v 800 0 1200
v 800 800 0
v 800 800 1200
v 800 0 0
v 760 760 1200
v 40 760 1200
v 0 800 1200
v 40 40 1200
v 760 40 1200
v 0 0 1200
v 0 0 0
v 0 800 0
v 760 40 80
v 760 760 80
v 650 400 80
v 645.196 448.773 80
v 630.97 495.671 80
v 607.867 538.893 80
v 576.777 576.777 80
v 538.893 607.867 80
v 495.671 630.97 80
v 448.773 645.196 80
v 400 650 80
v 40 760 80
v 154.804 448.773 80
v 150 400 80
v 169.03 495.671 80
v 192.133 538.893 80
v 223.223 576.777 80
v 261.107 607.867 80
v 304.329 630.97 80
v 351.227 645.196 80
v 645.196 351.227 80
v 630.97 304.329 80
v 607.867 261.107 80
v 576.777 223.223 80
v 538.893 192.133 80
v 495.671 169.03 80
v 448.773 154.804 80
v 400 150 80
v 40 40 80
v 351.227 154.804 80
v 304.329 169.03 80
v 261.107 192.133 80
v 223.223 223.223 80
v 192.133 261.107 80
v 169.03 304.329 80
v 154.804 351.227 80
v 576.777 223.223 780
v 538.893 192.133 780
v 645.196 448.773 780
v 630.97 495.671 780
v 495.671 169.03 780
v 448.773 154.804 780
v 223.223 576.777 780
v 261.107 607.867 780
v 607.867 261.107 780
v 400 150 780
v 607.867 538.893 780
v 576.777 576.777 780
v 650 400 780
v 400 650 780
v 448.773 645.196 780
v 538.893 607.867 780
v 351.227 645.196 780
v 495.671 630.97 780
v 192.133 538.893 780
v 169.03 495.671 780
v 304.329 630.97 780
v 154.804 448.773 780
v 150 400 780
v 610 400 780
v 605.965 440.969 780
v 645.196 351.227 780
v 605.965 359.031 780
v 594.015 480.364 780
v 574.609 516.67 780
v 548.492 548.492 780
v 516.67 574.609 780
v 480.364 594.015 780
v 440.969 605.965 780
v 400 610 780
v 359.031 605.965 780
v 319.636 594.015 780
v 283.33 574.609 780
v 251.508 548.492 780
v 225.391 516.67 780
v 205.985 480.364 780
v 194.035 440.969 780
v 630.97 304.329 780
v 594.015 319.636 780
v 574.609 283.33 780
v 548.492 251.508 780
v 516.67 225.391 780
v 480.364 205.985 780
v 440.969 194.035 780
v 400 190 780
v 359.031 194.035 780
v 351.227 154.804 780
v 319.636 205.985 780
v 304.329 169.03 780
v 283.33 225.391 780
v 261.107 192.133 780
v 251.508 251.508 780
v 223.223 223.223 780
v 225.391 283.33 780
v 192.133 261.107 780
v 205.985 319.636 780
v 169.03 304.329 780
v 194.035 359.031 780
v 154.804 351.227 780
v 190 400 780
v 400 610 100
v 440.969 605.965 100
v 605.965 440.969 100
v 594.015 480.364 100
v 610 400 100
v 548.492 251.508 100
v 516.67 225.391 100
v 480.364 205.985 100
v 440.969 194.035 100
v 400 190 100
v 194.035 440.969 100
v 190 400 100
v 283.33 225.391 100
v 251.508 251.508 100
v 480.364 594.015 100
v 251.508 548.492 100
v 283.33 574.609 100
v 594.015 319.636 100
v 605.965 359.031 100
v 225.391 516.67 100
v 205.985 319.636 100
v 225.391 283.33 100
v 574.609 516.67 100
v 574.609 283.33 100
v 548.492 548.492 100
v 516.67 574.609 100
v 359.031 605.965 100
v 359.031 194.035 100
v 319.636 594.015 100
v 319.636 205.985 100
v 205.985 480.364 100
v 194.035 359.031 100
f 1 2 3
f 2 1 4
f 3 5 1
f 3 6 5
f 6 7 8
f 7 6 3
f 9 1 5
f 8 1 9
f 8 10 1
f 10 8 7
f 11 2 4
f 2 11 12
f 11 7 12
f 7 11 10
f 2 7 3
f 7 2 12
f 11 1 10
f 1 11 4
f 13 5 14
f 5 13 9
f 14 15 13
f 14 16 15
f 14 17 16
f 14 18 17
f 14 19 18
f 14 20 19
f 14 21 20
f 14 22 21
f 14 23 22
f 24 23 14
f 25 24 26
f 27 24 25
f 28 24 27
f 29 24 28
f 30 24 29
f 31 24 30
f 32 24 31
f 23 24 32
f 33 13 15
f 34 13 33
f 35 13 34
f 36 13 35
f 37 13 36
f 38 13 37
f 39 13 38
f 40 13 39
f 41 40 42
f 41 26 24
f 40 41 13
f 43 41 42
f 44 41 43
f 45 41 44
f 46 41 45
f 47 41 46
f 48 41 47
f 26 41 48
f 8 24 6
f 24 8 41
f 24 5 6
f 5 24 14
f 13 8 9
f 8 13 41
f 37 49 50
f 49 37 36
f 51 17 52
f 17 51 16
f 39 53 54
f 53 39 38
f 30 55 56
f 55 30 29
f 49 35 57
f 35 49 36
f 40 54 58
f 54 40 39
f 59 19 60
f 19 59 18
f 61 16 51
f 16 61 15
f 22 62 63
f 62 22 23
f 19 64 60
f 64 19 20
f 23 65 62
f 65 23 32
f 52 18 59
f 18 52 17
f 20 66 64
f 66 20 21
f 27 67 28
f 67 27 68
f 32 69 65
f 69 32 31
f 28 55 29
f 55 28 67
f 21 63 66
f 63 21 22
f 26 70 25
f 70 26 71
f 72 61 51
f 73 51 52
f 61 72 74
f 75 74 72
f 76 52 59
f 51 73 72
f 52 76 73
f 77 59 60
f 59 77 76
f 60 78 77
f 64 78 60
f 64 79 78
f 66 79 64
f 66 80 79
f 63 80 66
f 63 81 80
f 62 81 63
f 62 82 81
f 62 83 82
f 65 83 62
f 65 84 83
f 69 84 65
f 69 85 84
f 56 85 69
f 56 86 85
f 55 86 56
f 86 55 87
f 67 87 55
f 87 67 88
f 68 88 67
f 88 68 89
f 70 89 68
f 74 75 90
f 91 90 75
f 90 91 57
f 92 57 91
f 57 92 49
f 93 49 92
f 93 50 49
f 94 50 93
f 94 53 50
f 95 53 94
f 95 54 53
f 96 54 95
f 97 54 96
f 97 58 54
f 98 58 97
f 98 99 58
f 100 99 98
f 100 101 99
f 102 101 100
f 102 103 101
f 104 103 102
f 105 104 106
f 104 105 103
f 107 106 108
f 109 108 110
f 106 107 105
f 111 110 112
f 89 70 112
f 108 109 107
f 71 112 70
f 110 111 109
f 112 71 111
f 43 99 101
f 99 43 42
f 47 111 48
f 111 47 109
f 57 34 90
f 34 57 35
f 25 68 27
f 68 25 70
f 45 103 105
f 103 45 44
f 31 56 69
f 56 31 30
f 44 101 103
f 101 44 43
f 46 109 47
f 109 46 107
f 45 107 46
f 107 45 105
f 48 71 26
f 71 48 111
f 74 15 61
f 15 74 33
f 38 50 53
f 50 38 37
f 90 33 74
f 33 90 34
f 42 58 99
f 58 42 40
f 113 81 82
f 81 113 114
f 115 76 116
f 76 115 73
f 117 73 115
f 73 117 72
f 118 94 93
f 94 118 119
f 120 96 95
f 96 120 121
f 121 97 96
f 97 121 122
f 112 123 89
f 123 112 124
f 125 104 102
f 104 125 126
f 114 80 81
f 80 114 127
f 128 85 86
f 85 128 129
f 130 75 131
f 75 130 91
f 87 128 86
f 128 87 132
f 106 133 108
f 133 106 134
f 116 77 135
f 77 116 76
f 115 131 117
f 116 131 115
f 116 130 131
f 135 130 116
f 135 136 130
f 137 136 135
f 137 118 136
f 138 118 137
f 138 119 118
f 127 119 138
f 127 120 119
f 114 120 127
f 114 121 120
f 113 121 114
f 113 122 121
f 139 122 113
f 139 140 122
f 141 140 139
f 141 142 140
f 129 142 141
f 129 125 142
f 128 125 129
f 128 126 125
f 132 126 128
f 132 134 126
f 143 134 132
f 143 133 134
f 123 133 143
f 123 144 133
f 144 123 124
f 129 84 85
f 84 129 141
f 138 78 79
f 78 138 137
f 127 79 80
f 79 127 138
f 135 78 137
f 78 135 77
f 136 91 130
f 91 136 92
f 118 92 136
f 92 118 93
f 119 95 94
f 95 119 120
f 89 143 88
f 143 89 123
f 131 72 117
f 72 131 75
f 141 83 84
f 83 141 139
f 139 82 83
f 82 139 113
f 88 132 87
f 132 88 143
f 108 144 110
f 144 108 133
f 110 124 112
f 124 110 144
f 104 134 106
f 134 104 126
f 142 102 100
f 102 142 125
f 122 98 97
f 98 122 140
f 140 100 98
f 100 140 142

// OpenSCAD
// file: ../params.scad
// Shared millimetre parameters. Keep in lockstep with freecad/params.py.
// Module scale: 150 kg/day wet train. Walls are CPVC sheet, not metal.

$fn = 36;

WALL        = 12;     // CPVC sheet thickness
FLOOR       = 16;     // floor plate (trough sits on this)

// LEACH CSTR 1 — inside liquor box
CSTR_L      = 2000;
CSTR_W      = 1200;
CSTR_H      = 1400;   // liquid + freeboard
FREEBOARD   = 200;

// CSTR 2 weir (same vessel, +X wall)
WEIR_W      = 450;
WEIR_CREST  = CSTR_H - FREEBOARD;   // from inner floor
WEIR_SLOT_H = 80;
WEIR_LIP    = 120;    // external spout projection

// CSTR 3 floor auger — injection-molded PVC / FG
AUGER_D     = 140;    // flight OD
AUGER_SHAFT = 40;
AUGER_PITCH = 110;
AUGER_TROUGH_W = 180;
AUGER_TROUGH_H = 110;
AUGER_OFFSET_Y = 280; // trough centreline from inner -Y wall
AUGER_INCLINE  = 28;  // deg, lifts out of liquor toward +X

// mixer / nozzles (lid)
MIXER_D     = 50;
GAS_D       = 80;     // acid-gas takeoff
DROP_X      = 80;     // inner-X of shred drop slot
DROP_L      = 400;
DROP_W      = 250;
DROP_COAM   = 80;     // raised coaming around the slot

// LEACHATE PUMP / coarse strainer — −X wall, opposite the weir
PUMP_D      = 80;     // DN80
PUMP_Z      = 450;    // centreline above inner floor (submerged)
PUMP_Y      = 900;    // centreline from inner −Y (away from auger)
STRAINER_L  = 180;
STRAINER_W  = 140;
STRAINER_H  = 160;

// mezzanine feed train
MEZZ_H      = 2200;   // platform top above tank outer floor
MEZZ_L      = 1600;   // platform length in −X
MEZZ_THK    = 12;
HOPPER_L    = 700;
HOPPER_W    = 600;
HOPPER_H    = 800;
SHRED_L     = 500;
SHRED_W     = 500;
SHRED_H     = 450;
CONV_W      = 240;
CONV_H      = 120;
CONV_PLATE  = 6;      // trough plate
CONV_FLANGE = 40;
CONV_SPRING_D = 50;
CONV_SPRING_H = 80;
CONV_BOLT   = 10;     // M10 clearance
CONV_LEN    = 1800;   // default standalone length; plant instance is computed
DUST_D      = 150;    // dust-hood outlet to DUST header
AUGER_LIFT_L = 700;

// dewater belts + split (Phase A 4–6)
FDEW_L      = 1800;
FDEW_W      = 450;
FDEW_H      = 80;
FDEW_RISE   = 120;    // solids end higher so liquor runs back to weir
SDEW_L      = 1400;
SDEW_W      = 220;
SDEW_H      = 80;
SPLIT_L     = 600;
SPLIT_W     = 500;
SPLIT_H     = 400;
STUB_L      = 400;
STUB_W      = 300;
STUB_H      = 250;

// EW funnel cell
EW_L        = 600;    // along aisle (overflow direction)
EW_W        = 420;    // anode-cathode depth
EW_H        = 650;    // rectangular body
EW_FUNNEL_H = 220;
EW_VALVE_D  = 50;
EW_VALVE_L  = 60;
EW_MEM_T    = 4;      // CEM
EW_SLOT     = 10;     // membrane cassette slot
EW_PITCH    = 750;    // aisle spacing, centre to centre
AISLE_X0    = 200;
AISLE_Y     = -(EW_W + 2*WALL) - 400;
AISLE_Z     = 400;
BUND_H      = 150;
BUND_PAD    = 250;
SUMP_L      = 400;
SUMP_W      = 400;
SUMP_H      = 300;
VDF_D       = 700;
VDF_L       = 900;
PAIL_W      = 180;
HDR_D       = 80;
HDR_Z       = 1400;
PYRO_D      = 320;
PYRO_L      = 2800;

// Campus envelopes — lockstep with freecad/params.py
FARM_X=12000; FARM_Y=8000; FARM_L=12000; FARM_W=8000; FARM_H=4500;
FAB_X=12000;  FAB_Y=-6000; FAB_L=8000;   FAB_W=6000;  FAB_H=4000;
HAB_X=-8000;  HAB_Y=8000;  HAB_L=8000;   HAB_W=6000;  HAB_H=3200;
CRYO_X=-6000; CRYO_Y=-4000; CRYO_L=4000; CRYO_W=3000; CRYO_H=3000;
MFG_X=2000;   MFG_Y=9000;  MFG_L=6000;   MFG_W=4000;  MFG_H=3500;

LIFE_Z_GREY=900; LIFE_Z_UPW=1100; LIFE_Z_ETCH=1300;
LIFE_Z_O2=2800; LIFE_Z_N2=3000; LIFE_Z_CO2=3200;
LIFE_D_GREY=50; LIFE_D_UPW=40; LIFE_D_ETCH=32;
LIFE_D_GAS=25; LIFE_D_CO2=40;
// main file
// 5.6 MELT — induction or oil-gas fired pot. Fuel from OIL LINE / afterburner gas.
include <../params.scad>;
$fn = 32;

module mfg_melt() {
    difference() {
        cube([800, 800, 1200]);
        translate([40, 40, 80]) cube([720, 720, 1120]);
    }
    translate([400, 400, 80])
        difference() {
            cylinder(h=700, d=500);
            translate([0, 0, 20]) cylinder(h=700, d=420);
        }
}
mfg_melt();
